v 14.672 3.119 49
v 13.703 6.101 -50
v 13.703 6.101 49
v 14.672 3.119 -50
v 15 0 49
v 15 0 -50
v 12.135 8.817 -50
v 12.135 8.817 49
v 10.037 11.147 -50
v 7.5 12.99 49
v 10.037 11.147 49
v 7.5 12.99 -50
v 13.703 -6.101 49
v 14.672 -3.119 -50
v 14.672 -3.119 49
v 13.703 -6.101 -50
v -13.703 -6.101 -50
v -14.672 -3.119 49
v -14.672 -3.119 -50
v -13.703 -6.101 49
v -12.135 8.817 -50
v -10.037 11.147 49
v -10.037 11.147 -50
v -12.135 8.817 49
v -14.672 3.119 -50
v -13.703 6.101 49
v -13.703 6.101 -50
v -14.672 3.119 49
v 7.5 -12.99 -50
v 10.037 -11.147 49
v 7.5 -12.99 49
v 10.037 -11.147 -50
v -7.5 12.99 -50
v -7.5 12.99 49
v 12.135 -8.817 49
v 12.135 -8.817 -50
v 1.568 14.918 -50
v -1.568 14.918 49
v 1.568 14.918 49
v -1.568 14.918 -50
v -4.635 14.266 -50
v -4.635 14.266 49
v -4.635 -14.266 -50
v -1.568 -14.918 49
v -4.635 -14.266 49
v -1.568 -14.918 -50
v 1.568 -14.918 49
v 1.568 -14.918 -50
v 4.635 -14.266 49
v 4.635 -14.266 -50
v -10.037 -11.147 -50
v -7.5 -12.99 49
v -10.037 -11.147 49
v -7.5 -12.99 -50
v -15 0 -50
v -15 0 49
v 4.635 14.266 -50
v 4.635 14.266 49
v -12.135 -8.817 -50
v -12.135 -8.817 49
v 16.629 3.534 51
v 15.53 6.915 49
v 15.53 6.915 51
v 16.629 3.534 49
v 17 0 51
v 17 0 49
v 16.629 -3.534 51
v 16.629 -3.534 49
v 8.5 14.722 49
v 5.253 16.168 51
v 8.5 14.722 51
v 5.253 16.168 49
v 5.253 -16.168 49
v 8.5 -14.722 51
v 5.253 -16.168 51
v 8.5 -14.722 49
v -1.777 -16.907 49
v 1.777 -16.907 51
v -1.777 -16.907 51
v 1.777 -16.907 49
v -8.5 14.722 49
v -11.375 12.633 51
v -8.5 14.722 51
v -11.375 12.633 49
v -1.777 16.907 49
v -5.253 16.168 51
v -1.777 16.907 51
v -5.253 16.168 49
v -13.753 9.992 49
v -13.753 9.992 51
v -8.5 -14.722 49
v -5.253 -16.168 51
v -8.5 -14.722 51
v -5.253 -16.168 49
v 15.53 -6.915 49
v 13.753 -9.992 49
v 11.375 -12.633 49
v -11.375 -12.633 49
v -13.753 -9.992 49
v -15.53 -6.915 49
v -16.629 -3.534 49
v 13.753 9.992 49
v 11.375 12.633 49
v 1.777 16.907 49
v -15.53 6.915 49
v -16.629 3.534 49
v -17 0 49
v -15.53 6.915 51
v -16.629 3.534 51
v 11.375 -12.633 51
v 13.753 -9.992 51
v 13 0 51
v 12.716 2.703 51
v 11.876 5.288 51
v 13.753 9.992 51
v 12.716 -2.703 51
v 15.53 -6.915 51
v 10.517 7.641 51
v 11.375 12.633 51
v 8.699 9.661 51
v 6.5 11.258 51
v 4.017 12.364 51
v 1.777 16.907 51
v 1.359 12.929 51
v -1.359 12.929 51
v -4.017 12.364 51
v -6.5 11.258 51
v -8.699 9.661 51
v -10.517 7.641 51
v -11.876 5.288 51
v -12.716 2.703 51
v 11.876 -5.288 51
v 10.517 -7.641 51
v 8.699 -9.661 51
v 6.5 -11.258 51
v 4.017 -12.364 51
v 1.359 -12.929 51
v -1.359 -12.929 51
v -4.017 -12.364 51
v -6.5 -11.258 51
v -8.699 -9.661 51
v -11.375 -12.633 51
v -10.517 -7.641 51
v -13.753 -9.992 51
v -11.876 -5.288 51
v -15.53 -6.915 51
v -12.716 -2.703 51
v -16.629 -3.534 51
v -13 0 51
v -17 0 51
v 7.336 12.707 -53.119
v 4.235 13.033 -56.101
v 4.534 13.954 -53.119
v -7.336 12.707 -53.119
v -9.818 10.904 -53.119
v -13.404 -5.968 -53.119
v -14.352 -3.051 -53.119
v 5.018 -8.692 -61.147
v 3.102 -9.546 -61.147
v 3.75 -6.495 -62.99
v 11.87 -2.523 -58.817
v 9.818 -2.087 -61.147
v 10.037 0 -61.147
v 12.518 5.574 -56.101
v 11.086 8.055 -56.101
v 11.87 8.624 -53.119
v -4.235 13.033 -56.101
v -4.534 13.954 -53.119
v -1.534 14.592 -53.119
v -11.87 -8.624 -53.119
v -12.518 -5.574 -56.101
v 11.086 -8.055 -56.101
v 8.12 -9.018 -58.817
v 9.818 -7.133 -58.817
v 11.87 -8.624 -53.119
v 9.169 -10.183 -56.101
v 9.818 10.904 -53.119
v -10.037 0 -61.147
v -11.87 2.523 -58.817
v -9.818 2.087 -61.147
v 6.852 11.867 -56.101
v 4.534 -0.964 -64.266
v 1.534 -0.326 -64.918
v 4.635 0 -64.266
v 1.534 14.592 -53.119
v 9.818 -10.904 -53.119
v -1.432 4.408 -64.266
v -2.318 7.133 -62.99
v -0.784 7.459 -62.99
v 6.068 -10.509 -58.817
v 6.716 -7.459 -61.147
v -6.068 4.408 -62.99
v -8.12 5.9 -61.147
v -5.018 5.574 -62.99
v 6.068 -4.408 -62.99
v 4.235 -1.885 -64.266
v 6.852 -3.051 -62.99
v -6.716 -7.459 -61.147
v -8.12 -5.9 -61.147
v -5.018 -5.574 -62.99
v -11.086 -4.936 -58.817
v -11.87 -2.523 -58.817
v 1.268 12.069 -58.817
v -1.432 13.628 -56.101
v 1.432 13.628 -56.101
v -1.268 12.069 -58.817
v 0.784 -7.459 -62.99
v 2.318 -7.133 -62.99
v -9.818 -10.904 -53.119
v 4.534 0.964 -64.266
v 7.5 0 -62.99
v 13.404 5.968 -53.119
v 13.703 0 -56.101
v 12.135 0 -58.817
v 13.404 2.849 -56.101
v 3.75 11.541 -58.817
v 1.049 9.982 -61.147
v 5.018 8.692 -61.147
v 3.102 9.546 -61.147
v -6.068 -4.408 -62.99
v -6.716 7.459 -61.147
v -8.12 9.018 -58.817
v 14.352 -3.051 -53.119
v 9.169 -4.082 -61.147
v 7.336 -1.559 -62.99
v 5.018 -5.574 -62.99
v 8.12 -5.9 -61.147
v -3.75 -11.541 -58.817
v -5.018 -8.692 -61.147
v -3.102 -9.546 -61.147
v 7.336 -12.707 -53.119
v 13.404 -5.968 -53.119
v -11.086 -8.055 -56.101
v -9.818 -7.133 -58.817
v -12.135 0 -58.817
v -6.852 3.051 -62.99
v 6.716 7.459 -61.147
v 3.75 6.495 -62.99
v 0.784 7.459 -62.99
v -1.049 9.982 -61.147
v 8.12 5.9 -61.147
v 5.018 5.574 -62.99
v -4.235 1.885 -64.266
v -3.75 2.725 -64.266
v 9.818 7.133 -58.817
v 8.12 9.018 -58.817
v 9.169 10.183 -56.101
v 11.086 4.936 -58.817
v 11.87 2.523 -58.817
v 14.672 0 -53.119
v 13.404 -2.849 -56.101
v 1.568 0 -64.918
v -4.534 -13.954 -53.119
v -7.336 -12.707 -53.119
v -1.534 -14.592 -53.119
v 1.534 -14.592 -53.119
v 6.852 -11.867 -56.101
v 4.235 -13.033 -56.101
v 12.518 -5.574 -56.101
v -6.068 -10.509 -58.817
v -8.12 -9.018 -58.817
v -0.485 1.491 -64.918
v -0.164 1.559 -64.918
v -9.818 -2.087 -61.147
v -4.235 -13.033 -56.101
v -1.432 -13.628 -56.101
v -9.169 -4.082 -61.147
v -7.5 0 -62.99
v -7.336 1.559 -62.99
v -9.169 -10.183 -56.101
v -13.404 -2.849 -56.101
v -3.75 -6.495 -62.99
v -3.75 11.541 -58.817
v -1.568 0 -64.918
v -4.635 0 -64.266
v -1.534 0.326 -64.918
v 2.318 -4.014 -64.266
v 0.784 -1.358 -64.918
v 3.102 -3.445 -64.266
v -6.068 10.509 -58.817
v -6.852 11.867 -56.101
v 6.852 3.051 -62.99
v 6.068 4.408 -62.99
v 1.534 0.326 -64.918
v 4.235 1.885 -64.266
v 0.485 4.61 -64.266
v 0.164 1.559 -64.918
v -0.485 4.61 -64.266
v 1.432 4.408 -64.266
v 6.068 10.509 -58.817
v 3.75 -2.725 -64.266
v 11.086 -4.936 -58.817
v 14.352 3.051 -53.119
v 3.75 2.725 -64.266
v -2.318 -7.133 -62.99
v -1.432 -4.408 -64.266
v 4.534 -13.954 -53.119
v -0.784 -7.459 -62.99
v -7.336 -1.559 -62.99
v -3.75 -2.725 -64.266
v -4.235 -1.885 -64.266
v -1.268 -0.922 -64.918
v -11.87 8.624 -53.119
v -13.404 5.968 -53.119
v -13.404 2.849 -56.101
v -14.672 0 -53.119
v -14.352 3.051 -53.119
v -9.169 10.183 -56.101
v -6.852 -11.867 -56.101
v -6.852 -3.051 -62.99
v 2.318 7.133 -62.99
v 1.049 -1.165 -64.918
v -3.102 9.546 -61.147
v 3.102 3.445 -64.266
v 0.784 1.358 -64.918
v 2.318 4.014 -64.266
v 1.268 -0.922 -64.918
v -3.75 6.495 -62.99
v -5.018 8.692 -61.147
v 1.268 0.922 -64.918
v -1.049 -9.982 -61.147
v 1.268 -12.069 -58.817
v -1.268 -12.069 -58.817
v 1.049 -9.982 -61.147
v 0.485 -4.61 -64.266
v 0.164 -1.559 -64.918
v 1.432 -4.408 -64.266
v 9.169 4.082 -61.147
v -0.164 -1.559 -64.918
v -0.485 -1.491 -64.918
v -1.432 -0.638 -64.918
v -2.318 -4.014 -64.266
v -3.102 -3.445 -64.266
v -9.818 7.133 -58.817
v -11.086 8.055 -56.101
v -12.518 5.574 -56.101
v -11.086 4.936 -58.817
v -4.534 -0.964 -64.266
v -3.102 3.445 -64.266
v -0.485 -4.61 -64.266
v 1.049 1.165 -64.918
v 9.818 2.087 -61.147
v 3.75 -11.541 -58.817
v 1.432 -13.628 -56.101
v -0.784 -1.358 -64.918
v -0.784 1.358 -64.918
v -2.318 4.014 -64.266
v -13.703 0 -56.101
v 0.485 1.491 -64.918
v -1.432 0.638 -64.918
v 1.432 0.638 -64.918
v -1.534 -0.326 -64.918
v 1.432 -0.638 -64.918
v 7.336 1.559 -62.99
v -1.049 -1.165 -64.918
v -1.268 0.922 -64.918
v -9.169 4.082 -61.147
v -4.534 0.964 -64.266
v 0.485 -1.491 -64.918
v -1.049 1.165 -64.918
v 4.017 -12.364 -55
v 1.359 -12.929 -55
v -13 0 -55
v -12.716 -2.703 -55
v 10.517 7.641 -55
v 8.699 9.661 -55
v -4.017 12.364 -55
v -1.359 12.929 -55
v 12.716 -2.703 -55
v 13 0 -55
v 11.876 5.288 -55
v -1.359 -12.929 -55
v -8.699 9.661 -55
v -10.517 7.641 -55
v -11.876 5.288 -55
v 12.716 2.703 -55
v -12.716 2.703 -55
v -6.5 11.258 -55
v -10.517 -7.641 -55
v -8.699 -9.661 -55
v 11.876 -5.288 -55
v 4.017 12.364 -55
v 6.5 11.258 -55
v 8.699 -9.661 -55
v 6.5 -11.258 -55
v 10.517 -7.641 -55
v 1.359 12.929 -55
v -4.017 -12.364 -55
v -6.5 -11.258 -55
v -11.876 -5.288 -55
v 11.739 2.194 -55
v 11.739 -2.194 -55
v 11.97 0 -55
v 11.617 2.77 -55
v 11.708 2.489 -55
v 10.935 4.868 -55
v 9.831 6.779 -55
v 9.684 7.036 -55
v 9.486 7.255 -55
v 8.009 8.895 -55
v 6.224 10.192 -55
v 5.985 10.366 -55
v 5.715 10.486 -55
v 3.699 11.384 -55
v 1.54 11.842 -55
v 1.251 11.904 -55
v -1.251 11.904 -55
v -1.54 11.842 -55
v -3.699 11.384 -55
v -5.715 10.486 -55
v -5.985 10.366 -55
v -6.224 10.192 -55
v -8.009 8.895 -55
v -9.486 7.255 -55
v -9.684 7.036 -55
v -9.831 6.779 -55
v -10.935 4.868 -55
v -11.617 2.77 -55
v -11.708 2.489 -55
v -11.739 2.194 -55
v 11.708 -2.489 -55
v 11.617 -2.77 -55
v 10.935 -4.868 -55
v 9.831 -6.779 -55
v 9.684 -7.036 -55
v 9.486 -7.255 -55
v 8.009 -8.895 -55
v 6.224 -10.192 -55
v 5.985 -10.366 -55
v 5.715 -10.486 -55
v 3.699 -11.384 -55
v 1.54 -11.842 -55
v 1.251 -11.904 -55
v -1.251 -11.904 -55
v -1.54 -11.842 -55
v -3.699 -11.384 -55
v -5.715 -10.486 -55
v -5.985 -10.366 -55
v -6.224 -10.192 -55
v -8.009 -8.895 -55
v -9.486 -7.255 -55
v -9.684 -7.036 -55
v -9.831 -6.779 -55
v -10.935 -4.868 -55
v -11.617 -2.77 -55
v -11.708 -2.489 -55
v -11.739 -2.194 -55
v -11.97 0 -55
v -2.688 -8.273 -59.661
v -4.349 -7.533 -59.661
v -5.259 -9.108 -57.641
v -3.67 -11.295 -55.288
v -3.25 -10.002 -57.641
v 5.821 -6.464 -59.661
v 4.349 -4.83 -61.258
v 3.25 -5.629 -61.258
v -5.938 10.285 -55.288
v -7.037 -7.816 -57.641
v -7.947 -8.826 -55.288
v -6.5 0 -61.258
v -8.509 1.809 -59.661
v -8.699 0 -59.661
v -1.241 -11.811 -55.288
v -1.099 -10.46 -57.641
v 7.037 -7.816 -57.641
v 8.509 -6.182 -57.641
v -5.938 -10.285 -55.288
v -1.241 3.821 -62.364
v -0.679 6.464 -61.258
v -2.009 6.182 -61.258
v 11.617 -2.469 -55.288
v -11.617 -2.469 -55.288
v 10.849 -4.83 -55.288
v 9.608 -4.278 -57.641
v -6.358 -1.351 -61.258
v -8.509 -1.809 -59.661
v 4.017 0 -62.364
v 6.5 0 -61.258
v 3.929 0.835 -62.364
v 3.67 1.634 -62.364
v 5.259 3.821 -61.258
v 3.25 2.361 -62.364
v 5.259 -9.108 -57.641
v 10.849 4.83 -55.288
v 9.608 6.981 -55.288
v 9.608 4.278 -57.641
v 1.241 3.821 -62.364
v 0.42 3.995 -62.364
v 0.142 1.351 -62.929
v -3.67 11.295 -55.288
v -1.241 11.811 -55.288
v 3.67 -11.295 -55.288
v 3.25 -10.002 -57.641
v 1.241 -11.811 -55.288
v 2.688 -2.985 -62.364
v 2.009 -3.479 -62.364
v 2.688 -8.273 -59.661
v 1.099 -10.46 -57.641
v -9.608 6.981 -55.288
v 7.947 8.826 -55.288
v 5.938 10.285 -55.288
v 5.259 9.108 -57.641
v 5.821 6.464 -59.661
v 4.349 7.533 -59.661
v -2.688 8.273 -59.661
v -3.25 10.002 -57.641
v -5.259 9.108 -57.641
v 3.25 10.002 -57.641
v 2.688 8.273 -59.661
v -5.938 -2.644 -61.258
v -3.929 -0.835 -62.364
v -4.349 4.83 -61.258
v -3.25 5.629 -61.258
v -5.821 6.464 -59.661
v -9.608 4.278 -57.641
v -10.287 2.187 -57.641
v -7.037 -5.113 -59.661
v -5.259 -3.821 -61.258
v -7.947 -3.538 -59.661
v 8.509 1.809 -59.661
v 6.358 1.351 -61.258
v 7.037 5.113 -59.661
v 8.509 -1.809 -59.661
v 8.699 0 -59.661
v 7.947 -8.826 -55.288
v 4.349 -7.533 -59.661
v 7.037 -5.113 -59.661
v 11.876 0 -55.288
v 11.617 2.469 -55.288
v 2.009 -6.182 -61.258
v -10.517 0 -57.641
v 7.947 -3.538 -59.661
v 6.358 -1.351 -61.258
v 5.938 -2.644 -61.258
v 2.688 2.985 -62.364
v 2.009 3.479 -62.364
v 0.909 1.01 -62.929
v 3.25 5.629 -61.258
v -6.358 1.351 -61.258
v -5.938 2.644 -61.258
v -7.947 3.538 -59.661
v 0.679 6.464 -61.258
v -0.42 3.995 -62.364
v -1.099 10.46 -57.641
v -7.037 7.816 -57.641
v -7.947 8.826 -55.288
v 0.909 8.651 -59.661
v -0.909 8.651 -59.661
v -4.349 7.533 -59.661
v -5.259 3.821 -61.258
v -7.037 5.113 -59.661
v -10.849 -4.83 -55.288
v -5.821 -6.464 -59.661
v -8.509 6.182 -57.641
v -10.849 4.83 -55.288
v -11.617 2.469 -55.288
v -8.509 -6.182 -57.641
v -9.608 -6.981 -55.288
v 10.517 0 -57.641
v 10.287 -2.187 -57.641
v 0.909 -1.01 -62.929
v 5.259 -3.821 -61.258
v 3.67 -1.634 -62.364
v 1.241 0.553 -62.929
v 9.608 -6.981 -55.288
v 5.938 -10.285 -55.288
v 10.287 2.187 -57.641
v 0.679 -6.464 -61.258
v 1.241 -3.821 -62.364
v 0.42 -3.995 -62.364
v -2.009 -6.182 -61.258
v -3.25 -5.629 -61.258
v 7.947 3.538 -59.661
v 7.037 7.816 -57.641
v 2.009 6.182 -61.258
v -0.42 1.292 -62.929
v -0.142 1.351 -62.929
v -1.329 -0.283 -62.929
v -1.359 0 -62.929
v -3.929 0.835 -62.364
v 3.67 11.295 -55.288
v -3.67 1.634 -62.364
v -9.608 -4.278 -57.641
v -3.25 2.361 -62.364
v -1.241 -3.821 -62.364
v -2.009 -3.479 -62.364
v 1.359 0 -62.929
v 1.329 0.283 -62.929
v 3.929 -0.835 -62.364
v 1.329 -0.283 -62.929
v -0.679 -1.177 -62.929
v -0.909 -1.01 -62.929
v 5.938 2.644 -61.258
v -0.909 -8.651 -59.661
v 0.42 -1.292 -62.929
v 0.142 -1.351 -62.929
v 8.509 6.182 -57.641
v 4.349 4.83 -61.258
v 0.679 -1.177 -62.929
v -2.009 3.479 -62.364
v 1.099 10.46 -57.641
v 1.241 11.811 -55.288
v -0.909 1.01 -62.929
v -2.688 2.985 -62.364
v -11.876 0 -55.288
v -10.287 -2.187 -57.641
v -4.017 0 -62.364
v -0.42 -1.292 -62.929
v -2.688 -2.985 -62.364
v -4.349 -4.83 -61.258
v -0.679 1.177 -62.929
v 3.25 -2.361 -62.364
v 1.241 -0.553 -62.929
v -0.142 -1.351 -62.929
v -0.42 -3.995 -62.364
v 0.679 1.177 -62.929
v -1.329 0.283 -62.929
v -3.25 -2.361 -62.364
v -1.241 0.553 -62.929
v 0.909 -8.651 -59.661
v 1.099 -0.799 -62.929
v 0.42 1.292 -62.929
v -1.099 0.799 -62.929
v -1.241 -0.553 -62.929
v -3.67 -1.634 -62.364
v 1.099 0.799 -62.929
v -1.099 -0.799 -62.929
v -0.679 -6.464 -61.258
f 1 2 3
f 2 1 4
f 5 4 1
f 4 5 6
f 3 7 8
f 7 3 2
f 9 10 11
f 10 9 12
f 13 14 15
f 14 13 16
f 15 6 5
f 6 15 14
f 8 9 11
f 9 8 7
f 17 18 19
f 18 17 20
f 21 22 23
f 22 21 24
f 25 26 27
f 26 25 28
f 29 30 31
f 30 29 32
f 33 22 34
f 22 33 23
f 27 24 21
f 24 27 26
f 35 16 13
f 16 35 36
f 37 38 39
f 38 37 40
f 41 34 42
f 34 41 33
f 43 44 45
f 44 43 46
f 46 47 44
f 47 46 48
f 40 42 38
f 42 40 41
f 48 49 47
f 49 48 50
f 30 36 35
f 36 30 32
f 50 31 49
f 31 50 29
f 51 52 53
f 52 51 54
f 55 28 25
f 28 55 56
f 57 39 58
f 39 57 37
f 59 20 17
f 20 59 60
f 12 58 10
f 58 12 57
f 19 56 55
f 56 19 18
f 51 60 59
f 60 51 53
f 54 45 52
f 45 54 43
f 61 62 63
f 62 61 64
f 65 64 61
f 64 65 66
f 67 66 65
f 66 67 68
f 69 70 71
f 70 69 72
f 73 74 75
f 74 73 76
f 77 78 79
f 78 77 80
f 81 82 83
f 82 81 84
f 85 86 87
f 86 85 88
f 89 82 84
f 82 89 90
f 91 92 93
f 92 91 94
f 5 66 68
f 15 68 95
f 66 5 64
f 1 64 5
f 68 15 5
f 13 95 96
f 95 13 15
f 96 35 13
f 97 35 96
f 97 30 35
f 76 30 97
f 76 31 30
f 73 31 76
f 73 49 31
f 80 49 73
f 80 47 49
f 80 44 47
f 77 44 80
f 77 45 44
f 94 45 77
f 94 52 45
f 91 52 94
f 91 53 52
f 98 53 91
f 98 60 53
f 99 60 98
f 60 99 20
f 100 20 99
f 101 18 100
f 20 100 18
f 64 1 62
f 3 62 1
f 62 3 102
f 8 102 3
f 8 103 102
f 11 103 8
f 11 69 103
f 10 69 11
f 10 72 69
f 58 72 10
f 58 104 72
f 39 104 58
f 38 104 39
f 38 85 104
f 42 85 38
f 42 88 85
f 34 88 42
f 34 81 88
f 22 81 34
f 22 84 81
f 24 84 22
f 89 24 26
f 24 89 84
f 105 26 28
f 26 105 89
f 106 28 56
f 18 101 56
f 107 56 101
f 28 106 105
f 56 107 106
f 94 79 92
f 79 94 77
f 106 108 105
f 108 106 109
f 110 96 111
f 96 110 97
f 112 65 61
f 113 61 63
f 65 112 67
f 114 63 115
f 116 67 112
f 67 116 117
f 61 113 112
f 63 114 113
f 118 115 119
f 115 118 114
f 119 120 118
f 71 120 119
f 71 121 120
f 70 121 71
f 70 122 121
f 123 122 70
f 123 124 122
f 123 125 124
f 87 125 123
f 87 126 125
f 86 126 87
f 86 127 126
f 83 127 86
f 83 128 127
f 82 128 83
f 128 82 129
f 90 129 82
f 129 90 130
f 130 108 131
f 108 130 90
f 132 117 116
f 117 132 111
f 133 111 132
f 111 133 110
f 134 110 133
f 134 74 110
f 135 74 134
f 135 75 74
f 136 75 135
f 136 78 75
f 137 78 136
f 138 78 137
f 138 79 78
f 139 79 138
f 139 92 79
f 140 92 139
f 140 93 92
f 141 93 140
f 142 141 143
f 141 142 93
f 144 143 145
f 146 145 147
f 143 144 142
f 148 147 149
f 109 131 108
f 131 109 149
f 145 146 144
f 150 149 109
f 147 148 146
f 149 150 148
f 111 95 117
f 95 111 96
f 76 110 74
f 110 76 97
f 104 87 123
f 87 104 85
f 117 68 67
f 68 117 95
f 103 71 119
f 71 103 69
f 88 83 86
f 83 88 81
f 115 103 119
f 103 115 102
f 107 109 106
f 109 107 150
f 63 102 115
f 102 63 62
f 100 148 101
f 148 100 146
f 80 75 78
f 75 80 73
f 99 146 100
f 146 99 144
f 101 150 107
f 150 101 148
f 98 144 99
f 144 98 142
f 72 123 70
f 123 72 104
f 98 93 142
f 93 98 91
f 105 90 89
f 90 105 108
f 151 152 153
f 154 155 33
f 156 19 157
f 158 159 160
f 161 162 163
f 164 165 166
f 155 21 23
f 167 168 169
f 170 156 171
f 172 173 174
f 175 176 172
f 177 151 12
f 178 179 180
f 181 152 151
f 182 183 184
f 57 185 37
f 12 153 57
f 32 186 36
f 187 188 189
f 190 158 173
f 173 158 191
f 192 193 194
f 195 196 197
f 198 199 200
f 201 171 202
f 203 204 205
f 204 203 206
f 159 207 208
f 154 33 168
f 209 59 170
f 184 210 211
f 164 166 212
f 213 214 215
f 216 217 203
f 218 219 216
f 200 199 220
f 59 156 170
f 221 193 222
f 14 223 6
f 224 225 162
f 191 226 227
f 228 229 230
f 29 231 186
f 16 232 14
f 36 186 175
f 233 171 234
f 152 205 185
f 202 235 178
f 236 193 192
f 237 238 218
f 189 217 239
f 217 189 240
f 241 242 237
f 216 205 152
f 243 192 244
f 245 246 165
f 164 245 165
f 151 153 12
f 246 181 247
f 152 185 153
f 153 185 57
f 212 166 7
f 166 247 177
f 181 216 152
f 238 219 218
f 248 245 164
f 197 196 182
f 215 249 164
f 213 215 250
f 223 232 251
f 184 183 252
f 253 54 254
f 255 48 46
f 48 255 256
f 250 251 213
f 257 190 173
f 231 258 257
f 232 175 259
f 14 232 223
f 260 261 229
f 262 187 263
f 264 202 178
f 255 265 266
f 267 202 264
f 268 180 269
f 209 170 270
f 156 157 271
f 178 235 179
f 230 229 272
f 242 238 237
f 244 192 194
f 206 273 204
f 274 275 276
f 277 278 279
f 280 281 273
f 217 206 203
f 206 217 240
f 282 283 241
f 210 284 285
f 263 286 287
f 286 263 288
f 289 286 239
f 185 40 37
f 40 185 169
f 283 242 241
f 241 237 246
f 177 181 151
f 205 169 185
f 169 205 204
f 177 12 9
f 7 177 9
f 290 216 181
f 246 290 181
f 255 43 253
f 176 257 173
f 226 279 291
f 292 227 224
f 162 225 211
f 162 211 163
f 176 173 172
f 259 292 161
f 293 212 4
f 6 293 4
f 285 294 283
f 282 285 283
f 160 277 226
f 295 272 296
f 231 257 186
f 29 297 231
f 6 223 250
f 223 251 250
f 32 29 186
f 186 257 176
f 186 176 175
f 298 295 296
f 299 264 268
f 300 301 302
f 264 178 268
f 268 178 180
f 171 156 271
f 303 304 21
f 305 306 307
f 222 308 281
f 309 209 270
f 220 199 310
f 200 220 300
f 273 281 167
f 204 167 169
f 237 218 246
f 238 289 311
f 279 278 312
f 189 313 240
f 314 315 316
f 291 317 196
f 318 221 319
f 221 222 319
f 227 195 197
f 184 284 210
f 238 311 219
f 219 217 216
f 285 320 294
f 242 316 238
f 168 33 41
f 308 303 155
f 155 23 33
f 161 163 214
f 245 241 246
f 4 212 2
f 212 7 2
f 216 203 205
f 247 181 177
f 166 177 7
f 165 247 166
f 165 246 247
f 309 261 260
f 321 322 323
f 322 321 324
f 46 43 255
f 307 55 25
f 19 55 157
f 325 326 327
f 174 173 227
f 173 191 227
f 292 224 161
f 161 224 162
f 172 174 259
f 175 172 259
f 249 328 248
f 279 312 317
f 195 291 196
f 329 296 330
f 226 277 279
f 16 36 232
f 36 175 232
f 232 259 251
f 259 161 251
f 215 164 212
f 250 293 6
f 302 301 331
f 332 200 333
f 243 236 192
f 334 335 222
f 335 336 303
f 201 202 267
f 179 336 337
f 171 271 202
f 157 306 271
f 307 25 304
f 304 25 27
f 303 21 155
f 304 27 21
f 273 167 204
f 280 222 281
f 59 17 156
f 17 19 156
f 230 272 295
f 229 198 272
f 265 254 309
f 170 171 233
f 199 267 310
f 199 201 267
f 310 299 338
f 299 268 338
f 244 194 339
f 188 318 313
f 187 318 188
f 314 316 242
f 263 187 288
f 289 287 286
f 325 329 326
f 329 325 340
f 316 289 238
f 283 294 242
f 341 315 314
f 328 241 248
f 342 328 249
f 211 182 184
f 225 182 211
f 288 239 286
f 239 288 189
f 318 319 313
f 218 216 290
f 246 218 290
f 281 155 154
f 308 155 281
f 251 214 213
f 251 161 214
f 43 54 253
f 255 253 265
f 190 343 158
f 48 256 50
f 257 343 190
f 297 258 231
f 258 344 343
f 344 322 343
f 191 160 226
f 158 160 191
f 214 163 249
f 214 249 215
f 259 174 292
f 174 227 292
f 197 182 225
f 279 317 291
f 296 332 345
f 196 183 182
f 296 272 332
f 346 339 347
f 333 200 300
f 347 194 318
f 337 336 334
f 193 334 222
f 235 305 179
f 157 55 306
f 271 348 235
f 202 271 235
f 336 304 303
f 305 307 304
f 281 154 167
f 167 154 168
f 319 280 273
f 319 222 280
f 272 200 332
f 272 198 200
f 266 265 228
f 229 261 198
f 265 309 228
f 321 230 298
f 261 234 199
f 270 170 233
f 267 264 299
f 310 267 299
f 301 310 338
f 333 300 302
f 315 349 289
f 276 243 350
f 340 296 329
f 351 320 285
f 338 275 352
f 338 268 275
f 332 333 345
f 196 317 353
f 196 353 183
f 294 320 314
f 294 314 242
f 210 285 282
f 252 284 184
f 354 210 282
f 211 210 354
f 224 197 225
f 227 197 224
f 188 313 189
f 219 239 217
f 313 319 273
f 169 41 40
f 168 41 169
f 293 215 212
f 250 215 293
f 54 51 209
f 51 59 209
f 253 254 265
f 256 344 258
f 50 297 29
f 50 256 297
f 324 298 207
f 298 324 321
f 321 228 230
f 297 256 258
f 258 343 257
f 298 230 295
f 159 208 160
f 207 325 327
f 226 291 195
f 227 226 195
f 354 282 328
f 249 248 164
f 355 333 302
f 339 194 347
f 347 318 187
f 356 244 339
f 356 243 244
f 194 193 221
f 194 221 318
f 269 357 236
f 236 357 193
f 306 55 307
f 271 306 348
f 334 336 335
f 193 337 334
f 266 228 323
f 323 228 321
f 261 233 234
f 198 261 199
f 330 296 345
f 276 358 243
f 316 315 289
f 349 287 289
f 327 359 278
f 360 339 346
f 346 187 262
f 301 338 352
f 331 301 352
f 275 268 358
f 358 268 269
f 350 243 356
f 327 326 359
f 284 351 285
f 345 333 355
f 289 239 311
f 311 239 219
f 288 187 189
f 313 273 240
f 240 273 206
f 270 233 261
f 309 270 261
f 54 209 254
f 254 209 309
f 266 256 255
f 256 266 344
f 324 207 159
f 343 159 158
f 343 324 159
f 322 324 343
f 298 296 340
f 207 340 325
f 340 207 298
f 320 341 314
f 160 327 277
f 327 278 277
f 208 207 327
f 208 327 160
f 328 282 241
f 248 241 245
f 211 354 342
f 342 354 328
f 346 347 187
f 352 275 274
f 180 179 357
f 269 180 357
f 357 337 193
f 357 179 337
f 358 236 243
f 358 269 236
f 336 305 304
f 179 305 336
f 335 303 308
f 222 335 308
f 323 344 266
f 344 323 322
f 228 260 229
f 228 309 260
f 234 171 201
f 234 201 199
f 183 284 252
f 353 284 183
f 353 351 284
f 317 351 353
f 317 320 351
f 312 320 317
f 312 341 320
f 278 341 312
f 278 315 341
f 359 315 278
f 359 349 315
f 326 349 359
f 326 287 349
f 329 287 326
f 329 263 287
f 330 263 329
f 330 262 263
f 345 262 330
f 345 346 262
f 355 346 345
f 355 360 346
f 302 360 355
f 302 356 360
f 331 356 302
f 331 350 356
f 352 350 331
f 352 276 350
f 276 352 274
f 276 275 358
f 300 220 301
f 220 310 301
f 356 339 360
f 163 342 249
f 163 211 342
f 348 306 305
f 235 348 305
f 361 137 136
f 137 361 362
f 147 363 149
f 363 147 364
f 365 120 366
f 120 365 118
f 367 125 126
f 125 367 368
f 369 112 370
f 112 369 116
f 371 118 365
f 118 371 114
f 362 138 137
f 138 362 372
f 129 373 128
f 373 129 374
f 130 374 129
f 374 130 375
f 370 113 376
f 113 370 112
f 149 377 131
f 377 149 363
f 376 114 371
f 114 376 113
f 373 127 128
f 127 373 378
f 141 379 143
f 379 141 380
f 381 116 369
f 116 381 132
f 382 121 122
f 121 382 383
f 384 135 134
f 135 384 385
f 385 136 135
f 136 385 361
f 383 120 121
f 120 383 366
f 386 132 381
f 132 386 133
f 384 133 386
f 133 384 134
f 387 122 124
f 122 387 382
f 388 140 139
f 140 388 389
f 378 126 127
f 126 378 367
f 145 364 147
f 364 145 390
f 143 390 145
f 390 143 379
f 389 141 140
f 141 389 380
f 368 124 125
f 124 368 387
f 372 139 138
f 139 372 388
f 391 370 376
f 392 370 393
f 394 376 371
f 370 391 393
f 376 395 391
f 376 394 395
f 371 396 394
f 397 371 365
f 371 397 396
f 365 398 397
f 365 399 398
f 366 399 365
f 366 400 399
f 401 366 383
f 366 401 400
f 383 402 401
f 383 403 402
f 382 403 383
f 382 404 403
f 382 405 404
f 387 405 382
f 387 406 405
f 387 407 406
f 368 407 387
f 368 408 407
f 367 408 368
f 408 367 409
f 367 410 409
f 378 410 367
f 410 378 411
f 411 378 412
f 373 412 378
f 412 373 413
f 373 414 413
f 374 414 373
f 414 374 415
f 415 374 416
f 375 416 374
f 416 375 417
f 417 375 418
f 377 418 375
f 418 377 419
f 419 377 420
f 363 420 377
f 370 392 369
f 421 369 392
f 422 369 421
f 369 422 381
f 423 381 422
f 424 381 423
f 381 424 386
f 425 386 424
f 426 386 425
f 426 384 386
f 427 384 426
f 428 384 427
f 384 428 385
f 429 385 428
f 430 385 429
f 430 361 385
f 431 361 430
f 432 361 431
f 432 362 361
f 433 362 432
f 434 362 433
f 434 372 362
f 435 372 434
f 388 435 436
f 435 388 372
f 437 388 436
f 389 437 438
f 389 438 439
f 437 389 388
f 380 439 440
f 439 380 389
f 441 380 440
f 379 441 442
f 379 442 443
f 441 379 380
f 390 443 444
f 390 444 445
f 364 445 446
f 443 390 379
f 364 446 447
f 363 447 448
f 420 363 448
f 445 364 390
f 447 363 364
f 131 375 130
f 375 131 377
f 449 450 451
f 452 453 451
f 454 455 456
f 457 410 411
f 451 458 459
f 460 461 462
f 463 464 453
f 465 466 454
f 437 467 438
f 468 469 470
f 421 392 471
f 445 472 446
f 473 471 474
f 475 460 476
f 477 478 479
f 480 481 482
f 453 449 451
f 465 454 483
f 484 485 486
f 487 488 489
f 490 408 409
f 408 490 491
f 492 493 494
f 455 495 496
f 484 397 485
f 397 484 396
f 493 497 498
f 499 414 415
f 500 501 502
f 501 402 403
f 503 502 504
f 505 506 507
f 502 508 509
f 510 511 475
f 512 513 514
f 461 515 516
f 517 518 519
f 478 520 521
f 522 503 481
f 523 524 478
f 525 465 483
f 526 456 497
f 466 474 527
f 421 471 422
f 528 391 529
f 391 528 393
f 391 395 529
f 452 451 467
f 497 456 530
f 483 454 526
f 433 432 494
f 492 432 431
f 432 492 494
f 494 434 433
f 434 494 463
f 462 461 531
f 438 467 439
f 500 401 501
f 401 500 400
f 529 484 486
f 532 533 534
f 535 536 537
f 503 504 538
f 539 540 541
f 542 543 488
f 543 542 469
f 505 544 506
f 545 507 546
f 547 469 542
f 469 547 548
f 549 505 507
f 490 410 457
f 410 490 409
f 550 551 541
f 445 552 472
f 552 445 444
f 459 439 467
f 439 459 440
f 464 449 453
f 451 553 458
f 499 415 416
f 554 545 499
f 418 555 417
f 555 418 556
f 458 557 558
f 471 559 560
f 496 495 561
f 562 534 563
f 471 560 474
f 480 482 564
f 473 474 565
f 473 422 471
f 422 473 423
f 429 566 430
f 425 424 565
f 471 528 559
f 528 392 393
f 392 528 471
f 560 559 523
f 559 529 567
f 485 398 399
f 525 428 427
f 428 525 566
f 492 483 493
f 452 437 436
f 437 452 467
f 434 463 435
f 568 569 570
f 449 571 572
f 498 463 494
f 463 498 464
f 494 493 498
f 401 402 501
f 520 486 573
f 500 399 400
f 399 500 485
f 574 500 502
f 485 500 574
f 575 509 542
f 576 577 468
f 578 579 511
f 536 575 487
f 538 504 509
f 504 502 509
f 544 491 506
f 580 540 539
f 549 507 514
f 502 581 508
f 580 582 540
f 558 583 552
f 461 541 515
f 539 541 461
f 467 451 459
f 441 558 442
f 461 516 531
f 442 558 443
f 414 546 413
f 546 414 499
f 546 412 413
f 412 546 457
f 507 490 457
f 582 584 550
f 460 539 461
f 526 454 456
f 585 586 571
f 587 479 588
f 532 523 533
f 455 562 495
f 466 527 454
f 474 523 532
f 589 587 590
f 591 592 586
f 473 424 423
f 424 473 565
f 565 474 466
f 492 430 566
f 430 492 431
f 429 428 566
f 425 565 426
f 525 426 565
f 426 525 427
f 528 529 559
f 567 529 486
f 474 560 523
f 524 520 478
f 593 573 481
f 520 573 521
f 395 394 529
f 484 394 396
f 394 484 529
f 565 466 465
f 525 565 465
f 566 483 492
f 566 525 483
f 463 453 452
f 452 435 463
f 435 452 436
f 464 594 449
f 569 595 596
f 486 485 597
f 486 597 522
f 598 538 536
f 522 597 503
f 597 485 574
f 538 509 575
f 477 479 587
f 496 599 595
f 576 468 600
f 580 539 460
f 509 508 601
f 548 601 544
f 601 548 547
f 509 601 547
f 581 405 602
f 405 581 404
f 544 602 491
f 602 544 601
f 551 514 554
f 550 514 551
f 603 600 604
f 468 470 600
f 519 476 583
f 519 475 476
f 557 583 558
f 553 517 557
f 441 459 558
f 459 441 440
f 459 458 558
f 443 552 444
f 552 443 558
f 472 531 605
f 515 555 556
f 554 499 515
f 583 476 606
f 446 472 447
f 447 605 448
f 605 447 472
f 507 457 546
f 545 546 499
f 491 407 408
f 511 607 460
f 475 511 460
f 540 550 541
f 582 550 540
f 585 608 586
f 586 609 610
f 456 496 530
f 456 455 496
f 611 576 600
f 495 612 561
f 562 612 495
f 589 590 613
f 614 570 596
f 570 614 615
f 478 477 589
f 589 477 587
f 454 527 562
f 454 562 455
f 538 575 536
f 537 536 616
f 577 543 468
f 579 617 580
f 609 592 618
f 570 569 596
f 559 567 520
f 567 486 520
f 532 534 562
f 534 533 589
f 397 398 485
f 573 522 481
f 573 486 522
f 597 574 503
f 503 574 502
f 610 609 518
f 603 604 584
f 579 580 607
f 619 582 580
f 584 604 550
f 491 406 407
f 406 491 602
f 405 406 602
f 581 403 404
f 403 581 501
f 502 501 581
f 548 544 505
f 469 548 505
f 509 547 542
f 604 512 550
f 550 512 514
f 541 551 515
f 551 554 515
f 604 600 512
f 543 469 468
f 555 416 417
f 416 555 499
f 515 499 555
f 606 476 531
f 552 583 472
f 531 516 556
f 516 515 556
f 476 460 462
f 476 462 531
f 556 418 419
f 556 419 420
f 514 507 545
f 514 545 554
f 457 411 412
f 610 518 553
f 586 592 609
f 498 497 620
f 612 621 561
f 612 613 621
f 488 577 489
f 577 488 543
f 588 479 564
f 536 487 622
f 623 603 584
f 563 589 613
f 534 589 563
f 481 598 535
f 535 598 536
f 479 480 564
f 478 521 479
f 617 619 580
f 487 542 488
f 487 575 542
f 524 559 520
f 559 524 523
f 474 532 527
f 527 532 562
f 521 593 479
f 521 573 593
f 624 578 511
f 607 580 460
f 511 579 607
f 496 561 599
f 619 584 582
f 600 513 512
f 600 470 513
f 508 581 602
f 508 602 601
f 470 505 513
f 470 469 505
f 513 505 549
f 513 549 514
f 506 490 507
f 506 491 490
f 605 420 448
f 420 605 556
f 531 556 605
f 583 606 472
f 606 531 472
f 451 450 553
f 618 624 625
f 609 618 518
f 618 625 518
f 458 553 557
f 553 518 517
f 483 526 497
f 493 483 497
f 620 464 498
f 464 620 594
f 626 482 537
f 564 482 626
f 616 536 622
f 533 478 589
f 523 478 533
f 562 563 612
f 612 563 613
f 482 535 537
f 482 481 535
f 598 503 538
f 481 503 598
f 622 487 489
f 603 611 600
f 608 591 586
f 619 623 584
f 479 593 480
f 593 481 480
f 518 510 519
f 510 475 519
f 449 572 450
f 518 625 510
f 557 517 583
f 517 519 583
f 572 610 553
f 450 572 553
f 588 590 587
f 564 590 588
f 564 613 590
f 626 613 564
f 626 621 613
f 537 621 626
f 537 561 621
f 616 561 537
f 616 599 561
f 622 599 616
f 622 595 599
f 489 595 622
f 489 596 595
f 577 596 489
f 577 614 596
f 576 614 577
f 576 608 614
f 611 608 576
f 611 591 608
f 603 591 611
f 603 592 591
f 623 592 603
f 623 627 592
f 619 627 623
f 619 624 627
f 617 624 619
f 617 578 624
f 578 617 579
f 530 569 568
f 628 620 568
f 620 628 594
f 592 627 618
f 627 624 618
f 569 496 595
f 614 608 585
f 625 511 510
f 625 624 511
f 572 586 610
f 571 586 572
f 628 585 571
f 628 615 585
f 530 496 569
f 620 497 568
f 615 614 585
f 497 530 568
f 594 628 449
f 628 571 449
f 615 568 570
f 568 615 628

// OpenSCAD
// This is my first fully parametric openSCAD object. i'm very proud of it. figured most of it out on a flight to SFO and finished the rest here at the Opal Hotel in SF. Thank you to The New Hobbyist for helping me cleanup the openSCAD code and make it look better in the Customizer 

// It is a flower vase for converting 3d printing filament spools to hold a bunch of flowers and provide water for them. Use Cylinder_Height, Exterior_Radius and Wall_Thickness to define the radius of the tube and the thickness of the walls, or use the Thingiverse Customizer. 

// This has not been tested yet - if anyone wants to print one for me i'd appreciate it. 

Cylinder_Height = 100; // height of cylinder
Exterior_Radius = 15; // exterior radius
Wall_Thickness = 2; //wall thickness & lip height
Lip_Radius = Exterior_Radius+Wall_Thickness; // ext lip radius

module vase(){
	difference(){
		exterior();
		color("red") interior();
	}
}

module interior() {
	union() {
		cylinder(h = Cylinder_Height+10, r = Exterior_Radius-Wall_Thickness, center = true);
		translate([0,0,-Cylinder_Height/2]) sphere(r= Exterior_Radius-Wall_Thickness);
	}
}

module exterior() {
	union() {
		cylinder(h = Cylinder_Height, r = Exterior_Radius, center = true);
		color("blue") translate([0,0,+Cylinder_Height/2]) cylinder(h = Wall_Thickness, r = Lip_Radius, center = true);
		translate([0,0,-Cylinder_Height/2]) sphere(r= Exterior_Radius);
	}
}

vase();
